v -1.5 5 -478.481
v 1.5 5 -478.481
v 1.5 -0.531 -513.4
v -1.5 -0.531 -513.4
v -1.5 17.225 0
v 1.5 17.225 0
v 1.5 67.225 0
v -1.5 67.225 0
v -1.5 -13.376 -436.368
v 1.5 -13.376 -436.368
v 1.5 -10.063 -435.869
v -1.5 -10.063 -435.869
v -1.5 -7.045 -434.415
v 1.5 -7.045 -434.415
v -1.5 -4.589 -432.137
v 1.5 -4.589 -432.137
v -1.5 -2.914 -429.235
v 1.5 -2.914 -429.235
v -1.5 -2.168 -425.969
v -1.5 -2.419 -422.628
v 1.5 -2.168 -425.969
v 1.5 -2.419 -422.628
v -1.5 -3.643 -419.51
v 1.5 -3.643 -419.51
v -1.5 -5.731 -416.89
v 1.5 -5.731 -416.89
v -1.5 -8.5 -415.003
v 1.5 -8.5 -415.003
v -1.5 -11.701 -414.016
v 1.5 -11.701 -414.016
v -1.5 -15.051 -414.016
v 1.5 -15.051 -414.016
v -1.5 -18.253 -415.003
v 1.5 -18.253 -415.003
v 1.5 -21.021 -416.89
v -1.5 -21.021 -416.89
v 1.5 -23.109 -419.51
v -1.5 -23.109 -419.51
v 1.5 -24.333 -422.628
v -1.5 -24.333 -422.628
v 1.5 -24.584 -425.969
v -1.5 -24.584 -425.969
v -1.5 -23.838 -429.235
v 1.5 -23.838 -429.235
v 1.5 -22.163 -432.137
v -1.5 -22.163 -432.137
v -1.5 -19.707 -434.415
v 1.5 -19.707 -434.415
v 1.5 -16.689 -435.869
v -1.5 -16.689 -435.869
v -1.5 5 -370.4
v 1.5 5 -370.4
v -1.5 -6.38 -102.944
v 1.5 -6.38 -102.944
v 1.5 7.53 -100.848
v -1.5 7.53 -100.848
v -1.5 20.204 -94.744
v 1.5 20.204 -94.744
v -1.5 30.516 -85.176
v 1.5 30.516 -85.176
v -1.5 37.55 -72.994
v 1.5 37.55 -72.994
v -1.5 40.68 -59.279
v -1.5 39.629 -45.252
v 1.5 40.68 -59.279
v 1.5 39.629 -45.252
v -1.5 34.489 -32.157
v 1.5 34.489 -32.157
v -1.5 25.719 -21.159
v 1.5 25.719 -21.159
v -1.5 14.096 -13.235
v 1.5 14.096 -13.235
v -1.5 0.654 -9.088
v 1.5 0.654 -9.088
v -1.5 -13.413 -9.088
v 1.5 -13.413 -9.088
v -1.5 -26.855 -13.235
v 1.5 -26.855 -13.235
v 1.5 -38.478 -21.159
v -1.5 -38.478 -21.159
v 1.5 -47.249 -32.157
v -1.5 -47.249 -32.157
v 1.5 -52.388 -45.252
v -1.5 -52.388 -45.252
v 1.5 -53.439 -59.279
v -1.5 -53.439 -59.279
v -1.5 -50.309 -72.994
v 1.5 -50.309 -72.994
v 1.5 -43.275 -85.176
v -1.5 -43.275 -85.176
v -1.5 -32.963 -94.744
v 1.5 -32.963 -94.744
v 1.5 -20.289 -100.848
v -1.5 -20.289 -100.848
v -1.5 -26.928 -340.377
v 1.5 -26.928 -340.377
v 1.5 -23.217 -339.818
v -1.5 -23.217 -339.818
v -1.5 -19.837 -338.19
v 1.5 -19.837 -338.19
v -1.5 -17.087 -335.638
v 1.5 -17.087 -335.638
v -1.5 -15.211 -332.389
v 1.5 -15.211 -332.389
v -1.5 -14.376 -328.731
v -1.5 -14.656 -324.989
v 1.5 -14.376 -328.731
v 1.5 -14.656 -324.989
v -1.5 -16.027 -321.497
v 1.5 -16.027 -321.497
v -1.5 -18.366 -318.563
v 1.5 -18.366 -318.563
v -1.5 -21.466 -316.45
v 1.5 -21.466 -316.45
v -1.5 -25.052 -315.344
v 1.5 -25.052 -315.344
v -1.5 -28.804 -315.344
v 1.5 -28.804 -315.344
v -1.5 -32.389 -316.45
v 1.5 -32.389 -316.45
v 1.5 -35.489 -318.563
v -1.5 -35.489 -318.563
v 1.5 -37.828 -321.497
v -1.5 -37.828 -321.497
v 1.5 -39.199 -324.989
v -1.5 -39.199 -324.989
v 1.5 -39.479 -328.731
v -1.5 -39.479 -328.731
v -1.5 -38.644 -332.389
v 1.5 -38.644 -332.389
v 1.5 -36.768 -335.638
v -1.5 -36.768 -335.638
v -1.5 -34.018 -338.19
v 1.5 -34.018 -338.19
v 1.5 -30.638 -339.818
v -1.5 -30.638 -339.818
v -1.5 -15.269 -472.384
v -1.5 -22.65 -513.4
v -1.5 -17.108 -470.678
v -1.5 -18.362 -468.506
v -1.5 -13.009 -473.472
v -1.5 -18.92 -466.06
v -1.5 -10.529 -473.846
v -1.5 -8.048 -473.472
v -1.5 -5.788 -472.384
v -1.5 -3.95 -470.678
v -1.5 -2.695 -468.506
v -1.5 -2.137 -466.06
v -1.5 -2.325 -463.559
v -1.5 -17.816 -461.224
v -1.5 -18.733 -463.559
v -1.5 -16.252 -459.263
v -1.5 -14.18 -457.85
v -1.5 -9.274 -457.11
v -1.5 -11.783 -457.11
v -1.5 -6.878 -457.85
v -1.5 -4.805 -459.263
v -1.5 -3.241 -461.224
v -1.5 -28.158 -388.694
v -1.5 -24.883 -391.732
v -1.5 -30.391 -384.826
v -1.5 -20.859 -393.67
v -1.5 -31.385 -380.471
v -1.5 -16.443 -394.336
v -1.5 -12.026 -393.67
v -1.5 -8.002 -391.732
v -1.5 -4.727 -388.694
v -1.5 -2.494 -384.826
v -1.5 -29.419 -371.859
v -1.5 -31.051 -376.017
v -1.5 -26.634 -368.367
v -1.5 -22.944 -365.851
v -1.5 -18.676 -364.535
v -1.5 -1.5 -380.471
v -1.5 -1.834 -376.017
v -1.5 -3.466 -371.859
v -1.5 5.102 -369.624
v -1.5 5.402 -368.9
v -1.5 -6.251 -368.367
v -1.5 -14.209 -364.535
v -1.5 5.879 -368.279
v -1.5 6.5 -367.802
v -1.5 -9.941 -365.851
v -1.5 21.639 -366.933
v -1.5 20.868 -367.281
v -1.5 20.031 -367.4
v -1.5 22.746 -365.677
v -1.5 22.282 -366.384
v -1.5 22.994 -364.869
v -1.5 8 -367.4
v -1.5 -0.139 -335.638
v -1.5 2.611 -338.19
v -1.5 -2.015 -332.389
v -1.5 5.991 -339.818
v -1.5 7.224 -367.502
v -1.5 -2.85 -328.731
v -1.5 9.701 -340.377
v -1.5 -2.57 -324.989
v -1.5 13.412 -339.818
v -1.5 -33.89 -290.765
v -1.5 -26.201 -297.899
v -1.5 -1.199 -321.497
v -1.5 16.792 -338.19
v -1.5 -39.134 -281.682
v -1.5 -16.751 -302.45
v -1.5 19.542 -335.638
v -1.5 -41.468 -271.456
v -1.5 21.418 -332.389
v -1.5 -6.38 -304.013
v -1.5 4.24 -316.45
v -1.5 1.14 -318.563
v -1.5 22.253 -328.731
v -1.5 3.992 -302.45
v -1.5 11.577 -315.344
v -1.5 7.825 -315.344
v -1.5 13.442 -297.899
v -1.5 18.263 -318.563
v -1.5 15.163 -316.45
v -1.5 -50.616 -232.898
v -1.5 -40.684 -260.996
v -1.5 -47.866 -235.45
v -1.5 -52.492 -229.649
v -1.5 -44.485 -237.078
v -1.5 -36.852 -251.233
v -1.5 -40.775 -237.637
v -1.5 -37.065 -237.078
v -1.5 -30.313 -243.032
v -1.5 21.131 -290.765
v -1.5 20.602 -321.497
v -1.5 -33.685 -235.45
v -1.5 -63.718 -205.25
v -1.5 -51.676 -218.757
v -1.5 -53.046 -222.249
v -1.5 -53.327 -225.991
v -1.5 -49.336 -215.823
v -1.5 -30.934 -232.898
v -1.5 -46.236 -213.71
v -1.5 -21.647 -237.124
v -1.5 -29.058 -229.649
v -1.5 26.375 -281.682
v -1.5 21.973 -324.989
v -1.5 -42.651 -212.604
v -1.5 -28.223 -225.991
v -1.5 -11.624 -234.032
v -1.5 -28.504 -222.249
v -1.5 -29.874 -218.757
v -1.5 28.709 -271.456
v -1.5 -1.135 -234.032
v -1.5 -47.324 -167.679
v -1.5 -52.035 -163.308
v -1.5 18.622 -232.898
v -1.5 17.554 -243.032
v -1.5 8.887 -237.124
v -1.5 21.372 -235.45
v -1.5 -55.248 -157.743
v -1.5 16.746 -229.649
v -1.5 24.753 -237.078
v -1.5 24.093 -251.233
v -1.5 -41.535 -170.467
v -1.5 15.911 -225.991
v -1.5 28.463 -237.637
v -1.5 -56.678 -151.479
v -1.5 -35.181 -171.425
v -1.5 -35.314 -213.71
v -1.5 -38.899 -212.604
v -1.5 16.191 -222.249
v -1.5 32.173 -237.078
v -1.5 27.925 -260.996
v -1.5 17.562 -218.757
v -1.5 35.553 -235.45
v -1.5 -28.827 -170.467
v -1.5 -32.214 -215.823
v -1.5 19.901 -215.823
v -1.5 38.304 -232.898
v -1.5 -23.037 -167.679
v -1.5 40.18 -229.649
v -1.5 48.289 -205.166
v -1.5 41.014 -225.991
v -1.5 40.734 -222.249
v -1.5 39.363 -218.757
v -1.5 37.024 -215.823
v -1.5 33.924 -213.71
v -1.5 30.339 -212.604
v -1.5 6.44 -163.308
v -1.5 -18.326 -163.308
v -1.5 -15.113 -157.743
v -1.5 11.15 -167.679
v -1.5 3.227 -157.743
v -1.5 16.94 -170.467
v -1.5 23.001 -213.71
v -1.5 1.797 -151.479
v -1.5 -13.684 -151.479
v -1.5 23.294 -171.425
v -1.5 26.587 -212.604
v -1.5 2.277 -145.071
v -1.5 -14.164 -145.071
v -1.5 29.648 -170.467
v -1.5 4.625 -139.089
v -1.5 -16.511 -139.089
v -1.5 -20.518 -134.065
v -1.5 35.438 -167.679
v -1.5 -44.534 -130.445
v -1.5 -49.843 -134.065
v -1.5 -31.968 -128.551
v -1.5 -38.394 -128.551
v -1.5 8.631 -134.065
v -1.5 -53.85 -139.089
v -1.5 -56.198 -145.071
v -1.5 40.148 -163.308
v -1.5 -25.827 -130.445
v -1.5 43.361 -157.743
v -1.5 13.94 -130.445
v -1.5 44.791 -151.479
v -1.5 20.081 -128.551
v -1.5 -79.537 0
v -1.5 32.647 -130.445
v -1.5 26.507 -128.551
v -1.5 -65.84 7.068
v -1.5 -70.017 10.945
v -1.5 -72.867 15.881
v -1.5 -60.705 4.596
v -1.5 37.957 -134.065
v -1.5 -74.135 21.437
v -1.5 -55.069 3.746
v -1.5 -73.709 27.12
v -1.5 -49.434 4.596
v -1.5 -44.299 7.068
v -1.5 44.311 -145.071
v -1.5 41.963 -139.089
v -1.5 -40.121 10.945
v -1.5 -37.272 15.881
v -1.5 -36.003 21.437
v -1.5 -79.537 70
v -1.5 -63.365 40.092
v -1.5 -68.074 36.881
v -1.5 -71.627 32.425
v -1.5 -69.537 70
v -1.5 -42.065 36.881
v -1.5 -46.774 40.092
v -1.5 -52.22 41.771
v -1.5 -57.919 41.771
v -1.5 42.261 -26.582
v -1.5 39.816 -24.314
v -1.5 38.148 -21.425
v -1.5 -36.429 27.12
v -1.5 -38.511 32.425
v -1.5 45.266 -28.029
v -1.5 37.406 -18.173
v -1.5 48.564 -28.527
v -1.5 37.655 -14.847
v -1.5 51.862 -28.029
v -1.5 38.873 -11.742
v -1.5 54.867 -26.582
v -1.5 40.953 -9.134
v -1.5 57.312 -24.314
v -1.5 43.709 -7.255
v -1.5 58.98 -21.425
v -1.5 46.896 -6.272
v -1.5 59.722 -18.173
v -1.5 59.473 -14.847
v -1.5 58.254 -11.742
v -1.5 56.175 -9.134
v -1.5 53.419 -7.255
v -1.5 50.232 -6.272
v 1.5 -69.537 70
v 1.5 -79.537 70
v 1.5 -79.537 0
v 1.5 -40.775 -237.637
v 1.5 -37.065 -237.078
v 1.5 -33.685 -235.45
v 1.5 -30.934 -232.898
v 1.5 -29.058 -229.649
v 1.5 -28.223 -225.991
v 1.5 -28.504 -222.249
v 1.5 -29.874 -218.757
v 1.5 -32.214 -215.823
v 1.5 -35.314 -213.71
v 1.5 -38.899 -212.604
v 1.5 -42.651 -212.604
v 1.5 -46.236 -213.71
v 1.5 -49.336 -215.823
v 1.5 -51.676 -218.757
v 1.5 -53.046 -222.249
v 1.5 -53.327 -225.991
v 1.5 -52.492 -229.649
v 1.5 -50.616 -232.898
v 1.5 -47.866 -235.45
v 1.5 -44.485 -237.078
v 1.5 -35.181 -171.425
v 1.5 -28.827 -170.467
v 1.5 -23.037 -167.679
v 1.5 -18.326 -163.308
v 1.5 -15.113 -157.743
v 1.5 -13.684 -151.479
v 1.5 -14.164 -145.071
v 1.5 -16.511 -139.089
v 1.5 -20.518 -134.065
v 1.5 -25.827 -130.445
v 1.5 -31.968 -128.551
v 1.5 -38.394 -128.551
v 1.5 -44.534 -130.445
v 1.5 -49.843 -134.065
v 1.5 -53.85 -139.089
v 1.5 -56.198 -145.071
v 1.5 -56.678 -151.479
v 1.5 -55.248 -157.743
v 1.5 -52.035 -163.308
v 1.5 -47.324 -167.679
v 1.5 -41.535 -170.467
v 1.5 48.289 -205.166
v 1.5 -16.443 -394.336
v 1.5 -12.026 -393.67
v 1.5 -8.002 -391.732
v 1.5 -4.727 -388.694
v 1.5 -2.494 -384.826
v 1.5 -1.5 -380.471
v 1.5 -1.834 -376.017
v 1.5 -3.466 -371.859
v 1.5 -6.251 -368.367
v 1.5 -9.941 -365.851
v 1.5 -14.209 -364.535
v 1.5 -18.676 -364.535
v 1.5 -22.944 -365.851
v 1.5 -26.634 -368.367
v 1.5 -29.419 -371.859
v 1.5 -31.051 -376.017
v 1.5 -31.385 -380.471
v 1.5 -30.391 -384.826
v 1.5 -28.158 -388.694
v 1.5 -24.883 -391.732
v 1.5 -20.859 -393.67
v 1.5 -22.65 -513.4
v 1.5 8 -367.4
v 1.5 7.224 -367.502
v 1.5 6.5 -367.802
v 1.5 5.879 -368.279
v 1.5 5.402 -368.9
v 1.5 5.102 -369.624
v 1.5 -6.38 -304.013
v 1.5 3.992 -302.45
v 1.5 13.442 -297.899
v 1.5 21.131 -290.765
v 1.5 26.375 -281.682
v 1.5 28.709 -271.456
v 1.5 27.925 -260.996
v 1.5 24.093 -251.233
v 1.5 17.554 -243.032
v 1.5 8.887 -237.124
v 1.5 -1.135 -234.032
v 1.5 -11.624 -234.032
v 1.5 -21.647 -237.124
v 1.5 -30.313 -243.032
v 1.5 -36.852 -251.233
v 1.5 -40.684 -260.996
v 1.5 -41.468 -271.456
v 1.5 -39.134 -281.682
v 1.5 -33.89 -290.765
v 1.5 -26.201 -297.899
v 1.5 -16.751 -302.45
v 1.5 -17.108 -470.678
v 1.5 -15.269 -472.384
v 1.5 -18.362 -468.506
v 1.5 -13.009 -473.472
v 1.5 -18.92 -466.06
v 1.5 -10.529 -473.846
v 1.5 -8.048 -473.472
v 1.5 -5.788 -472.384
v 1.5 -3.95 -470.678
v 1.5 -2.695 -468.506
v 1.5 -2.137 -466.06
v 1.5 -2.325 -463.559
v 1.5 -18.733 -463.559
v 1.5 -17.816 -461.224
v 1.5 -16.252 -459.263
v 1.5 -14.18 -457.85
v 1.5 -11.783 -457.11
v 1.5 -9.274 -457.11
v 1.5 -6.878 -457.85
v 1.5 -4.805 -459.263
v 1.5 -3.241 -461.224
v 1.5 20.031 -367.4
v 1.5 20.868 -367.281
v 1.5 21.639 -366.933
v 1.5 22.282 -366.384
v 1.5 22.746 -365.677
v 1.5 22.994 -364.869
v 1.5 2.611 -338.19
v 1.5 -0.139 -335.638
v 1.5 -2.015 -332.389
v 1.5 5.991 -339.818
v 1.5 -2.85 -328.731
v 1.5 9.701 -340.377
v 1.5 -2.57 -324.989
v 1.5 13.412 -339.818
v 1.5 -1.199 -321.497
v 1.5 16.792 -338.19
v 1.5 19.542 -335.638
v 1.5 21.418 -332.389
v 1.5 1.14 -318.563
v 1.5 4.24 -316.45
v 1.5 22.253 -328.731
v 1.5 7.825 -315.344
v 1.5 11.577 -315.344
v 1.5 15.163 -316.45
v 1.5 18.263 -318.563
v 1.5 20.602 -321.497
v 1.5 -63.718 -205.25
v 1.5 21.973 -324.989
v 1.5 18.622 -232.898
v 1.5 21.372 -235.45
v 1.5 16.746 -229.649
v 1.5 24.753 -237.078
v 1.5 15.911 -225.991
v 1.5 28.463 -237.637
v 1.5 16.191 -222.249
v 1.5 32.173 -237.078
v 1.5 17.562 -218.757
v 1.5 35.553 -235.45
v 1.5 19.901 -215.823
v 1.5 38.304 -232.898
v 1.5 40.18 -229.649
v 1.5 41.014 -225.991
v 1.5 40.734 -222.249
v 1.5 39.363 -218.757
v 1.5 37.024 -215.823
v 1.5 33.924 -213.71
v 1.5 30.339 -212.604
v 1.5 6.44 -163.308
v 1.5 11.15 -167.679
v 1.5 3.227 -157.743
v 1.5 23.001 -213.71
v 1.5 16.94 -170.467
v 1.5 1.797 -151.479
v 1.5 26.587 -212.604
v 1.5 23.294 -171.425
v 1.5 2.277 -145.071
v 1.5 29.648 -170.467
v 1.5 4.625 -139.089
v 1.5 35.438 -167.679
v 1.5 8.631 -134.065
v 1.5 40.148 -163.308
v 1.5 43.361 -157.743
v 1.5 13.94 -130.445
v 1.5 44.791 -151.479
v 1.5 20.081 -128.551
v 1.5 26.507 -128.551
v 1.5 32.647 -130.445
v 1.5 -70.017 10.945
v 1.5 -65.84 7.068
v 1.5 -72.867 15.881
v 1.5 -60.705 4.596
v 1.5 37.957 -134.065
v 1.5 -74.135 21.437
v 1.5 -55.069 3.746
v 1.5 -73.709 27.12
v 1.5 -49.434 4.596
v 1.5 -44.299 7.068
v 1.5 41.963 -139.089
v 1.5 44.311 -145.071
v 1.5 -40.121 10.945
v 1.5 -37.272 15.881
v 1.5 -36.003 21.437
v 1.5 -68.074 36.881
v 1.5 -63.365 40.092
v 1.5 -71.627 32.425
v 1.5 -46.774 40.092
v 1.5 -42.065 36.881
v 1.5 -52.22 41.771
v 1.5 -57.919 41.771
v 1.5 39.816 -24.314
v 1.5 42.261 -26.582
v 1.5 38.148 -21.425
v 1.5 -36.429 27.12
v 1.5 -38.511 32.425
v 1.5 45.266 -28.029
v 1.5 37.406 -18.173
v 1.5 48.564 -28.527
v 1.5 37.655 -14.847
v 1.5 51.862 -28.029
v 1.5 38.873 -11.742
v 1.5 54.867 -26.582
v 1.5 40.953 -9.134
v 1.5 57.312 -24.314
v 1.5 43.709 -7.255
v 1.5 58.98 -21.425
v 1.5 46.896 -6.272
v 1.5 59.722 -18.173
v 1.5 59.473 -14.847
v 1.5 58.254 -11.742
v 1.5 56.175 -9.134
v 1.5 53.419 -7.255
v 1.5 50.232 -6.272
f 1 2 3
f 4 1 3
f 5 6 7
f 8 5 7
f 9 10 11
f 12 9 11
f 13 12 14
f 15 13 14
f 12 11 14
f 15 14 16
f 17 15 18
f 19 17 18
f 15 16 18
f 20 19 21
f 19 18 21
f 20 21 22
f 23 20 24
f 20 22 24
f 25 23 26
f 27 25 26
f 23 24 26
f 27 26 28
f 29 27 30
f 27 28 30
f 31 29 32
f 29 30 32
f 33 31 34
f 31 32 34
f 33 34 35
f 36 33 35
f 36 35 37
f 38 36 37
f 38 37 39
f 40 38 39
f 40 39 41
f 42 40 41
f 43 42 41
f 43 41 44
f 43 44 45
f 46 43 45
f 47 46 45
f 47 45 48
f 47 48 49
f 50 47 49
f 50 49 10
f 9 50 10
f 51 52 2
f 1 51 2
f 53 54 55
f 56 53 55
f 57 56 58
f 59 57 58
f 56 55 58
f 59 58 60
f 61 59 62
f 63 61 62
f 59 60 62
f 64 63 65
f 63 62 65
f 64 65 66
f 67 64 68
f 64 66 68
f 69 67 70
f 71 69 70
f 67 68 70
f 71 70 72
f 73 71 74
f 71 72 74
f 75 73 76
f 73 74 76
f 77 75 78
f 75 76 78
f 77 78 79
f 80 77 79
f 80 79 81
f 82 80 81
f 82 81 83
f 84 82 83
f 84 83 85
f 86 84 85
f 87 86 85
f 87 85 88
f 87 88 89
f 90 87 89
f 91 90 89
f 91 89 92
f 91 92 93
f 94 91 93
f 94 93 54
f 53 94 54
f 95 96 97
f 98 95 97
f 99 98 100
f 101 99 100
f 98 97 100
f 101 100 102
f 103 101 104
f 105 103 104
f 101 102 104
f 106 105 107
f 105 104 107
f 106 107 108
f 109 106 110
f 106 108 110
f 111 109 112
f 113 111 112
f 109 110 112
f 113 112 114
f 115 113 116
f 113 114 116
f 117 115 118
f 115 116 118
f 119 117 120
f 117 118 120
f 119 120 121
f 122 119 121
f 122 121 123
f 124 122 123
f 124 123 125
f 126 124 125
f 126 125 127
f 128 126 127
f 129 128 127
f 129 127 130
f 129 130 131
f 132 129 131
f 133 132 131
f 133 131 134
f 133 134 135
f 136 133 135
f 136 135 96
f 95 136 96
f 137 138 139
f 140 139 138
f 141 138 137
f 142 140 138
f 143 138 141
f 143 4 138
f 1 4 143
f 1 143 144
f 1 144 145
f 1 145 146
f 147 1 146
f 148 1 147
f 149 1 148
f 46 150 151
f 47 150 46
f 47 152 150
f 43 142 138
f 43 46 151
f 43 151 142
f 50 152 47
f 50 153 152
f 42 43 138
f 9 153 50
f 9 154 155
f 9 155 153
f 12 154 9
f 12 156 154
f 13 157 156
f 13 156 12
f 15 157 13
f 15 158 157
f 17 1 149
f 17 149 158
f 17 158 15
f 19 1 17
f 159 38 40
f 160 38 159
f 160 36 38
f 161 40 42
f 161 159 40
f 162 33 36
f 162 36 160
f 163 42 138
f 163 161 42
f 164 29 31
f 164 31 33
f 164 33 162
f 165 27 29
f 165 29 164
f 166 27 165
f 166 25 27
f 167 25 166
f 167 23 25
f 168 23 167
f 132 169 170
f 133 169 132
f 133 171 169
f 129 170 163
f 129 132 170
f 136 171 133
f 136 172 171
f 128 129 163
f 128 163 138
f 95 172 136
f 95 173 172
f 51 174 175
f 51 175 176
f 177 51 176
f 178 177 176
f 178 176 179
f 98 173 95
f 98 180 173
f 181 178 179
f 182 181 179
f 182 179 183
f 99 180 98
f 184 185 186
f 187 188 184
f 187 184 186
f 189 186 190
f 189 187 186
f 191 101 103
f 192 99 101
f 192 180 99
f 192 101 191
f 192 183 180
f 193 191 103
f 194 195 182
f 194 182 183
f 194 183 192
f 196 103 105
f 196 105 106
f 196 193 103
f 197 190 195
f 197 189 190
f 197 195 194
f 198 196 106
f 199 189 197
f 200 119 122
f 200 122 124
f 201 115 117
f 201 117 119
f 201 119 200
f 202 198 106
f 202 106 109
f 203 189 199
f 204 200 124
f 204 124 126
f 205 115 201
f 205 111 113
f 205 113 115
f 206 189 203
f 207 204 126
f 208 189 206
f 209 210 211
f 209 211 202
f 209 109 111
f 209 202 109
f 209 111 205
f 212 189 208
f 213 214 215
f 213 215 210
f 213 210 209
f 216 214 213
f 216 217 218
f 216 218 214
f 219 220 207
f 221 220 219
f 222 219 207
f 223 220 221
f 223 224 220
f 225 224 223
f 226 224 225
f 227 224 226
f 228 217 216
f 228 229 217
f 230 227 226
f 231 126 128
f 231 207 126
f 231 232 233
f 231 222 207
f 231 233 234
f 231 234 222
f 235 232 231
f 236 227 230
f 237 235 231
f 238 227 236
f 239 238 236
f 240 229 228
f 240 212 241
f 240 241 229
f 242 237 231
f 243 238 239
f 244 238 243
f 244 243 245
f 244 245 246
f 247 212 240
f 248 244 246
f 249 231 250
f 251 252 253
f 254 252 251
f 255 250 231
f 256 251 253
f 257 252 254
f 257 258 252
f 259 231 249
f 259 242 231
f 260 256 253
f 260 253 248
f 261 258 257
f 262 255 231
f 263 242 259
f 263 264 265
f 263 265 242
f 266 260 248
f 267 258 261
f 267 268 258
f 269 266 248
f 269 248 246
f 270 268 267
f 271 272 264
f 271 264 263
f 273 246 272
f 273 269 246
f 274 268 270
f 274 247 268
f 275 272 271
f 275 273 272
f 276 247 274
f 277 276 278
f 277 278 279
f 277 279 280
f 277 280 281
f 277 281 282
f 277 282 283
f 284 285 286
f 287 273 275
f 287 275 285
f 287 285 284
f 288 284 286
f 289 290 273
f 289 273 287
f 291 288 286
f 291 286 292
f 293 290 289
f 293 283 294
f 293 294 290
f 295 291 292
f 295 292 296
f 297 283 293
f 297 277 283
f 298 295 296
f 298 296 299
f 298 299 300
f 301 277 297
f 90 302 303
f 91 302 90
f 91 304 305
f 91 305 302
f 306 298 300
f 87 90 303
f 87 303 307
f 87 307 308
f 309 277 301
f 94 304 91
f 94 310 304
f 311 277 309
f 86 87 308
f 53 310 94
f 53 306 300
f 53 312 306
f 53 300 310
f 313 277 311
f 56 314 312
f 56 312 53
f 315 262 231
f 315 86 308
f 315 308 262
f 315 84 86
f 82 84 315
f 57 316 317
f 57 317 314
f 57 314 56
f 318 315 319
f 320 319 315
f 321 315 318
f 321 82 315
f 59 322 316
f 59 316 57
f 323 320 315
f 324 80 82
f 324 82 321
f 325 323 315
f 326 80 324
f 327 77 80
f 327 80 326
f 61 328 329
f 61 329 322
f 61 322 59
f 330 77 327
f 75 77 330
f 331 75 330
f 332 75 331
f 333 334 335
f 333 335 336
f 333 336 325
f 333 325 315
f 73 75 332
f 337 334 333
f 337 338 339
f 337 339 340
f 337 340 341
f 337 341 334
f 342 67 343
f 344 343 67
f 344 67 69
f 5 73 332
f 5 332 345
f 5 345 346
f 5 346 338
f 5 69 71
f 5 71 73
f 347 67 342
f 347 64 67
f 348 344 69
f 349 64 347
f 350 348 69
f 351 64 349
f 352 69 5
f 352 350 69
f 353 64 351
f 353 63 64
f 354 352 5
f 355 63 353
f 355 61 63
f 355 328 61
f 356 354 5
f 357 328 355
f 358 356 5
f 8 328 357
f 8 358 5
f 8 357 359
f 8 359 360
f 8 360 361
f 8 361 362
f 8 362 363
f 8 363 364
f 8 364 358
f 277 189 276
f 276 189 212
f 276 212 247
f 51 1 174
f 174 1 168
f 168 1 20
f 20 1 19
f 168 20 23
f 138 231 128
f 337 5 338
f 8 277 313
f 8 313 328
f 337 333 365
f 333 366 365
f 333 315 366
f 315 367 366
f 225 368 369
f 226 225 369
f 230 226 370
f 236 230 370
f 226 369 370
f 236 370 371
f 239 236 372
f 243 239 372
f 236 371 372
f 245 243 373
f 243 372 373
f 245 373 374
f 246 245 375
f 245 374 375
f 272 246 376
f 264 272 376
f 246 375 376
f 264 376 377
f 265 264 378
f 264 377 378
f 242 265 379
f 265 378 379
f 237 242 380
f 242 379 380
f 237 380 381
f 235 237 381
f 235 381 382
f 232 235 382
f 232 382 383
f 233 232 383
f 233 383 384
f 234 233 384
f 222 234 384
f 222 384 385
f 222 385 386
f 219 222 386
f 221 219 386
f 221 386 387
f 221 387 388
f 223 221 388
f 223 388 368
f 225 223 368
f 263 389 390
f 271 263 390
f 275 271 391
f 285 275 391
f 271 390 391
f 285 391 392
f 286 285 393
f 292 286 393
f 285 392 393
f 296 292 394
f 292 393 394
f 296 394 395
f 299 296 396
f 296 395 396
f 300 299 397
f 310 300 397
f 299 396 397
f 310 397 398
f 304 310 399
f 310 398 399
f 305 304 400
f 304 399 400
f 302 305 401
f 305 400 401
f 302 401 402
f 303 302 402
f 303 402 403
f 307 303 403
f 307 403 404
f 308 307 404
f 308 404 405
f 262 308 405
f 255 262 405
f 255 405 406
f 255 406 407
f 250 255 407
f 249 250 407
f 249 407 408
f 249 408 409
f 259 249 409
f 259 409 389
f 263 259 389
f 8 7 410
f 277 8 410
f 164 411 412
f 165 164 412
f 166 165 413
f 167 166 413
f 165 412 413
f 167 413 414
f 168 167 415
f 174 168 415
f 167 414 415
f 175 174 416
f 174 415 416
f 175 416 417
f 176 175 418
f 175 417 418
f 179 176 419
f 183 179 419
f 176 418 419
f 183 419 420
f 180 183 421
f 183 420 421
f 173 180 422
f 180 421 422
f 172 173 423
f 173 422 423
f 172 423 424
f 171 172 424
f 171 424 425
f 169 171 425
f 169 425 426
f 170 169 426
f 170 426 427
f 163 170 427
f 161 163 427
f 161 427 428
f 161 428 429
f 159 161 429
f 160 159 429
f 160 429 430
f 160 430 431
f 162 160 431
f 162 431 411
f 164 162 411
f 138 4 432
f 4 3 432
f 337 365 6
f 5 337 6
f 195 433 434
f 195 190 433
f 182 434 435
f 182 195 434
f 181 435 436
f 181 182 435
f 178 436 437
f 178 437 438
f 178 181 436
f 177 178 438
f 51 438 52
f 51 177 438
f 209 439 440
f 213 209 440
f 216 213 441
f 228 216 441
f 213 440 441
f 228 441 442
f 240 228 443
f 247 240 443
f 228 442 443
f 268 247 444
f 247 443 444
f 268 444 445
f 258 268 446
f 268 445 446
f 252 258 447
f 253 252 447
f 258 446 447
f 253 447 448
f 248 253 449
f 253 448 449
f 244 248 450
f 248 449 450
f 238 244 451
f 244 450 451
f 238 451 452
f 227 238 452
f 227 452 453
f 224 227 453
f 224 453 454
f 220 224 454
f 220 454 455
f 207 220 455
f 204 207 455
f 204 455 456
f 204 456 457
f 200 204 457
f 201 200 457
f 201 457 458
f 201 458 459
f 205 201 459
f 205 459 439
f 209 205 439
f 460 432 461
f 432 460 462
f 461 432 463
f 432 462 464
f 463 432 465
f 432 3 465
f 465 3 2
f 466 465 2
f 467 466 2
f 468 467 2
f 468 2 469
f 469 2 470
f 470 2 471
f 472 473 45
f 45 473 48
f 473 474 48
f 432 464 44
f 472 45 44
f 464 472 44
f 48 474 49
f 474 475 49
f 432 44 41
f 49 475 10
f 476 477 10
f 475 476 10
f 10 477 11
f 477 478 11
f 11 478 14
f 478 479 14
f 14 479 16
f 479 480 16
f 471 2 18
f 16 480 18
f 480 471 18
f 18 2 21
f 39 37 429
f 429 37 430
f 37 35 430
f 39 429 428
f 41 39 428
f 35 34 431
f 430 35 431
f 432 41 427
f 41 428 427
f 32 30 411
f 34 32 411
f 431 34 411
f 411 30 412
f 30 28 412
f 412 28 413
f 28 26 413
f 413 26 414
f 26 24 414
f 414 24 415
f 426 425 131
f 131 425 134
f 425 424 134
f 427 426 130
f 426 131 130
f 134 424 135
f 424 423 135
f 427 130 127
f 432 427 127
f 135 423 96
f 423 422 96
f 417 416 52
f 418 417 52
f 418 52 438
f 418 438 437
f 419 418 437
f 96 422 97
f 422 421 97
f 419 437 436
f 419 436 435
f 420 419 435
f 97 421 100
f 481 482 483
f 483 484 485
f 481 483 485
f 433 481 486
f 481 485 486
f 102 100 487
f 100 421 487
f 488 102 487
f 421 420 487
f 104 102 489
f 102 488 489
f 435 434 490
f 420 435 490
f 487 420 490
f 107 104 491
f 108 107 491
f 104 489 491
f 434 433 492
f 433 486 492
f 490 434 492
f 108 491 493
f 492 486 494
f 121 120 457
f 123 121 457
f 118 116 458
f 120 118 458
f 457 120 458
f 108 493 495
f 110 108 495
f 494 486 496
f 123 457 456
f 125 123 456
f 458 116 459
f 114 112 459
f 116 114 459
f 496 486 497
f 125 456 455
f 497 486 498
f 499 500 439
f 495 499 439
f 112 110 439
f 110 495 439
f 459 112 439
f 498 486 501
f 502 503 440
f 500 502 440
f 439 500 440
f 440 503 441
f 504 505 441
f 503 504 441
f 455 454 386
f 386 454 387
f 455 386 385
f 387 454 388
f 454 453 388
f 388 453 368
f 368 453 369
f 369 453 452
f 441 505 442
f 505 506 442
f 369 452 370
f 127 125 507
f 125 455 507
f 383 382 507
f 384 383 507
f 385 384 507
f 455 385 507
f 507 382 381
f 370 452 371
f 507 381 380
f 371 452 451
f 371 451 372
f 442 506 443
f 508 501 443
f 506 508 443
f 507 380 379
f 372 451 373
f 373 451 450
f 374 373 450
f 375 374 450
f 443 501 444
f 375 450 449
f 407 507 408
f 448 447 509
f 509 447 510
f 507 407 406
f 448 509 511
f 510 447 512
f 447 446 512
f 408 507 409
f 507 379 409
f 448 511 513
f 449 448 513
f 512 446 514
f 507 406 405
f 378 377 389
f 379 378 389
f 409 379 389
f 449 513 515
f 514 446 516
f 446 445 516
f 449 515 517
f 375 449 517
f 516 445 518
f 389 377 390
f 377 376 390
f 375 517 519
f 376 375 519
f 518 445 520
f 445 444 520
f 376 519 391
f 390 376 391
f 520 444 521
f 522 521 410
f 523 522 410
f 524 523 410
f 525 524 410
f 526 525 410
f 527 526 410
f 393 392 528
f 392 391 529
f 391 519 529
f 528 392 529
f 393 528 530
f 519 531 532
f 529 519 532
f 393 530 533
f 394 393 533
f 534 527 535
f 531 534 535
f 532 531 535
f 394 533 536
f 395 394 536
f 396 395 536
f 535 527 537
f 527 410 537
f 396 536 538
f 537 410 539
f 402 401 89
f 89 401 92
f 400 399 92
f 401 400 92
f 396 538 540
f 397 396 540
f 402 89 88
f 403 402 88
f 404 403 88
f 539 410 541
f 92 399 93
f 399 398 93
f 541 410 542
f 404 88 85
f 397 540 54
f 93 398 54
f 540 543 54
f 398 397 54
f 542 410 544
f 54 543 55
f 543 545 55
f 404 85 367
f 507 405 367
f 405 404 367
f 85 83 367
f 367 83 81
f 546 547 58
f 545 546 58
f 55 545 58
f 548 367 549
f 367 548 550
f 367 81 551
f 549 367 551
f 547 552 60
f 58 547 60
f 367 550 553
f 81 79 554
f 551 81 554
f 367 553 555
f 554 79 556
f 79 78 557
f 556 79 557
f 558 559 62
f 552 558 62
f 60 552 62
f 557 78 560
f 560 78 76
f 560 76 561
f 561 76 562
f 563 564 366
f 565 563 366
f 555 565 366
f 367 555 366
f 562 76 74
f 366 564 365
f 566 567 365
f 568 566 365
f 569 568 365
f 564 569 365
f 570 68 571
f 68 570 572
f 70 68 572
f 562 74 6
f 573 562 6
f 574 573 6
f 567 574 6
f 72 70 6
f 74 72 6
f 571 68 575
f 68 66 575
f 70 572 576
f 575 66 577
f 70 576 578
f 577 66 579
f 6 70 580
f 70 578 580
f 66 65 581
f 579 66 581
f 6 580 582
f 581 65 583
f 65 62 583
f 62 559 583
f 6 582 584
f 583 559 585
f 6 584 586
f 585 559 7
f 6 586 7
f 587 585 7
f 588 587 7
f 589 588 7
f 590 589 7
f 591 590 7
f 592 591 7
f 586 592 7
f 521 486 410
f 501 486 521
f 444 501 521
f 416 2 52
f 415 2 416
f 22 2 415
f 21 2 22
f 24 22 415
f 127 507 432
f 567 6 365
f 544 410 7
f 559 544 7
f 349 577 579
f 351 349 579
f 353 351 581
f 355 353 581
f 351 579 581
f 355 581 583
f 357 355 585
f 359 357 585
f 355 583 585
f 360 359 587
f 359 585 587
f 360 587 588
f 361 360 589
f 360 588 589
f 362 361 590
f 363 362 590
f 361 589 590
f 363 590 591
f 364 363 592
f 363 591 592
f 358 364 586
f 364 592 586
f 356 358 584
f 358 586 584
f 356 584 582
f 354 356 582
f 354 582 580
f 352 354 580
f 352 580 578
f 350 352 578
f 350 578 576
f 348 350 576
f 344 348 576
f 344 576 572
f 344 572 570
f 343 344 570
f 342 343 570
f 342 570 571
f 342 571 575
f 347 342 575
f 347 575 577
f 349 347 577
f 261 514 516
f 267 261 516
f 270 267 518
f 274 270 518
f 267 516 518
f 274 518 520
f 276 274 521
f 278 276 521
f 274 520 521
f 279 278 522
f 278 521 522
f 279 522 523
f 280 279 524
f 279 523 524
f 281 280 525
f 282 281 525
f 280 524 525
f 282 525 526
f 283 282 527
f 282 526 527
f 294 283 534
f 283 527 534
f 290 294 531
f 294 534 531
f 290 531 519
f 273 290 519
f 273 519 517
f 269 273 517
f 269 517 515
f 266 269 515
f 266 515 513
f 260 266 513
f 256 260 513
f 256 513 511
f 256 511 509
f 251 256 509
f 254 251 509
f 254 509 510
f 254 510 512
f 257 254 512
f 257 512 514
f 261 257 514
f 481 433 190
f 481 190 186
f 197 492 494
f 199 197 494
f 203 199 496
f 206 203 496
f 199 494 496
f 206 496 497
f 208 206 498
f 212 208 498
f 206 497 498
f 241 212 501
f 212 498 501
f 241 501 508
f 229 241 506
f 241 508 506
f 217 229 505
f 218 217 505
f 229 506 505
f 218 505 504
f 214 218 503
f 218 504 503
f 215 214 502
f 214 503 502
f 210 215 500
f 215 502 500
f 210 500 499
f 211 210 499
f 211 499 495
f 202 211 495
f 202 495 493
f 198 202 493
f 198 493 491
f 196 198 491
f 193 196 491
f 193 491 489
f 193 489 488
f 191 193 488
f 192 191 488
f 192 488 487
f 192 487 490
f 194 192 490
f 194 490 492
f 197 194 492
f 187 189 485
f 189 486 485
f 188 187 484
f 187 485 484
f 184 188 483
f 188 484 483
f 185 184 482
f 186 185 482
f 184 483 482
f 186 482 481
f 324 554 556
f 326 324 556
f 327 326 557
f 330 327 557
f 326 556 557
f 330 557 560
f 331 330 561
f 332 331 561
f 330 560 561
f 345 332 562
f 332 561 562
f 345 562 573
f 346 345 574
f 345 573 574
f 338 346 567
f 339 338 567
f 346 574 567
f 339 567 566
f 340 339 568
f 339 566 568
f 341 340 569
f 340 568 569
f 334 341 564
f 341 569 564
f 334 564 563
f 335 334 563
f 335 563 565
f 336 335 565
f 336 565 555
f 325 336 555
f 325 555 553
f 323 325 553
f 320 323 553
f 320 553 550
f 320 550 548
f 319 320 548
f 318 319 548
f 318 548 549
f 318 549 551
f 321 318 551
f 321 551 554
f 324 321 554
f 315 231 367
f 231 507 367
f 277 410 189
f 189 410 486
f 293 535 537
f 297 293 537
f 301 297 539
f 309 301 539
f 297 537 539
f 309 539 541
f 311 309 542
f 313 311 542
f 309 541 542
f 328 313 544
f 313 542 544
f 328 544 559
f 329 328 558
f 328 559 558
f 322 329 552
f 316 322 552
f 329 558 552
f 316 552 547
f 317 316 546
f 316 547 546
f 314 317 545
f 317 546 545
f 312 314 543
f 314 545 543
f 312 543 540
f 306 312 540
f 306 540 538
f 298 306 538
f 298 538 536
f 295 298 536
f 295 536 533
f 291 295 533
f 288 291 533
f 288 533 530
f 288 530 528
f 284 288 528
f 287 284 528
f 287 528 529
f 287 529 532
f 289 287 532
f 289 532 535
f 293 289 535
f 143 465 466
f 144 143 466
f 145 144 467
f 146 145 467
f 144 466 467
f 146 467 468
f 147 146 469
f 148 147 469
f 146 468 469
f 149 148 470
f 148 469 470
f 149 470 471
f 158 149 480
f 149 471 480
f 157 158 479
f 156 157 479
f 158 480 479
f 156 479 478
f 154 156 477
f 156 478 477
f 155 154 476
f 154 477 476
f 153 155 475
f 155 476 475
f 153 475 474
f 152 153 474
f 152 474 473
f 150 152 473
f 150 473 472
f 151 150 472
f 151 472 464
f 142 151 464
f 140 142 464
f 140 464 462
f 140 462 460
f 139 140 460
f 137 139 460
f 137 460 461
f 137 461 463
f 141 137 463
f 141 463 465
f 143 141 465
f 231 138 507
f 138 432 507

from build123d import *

# Parameters (mm, degrees)
BOSS_EXTRUDE1_DEPTH      = 1.5
BOSS_EXTRUDE1_DEPTH_BACK = 1.5
SKETCH3_W                = 152
SKETCH3_H                = 25
CUT_EXTRUDE1_DEPTH       = 520.533194562
SKETCH4_R                = 19.119387796
SKETCH4_R_2              = 47.191393473
SKETCH4_R_3              = 35.18699184
SKETCH4_R_4              = 12.586978738
SKETCH4_R_5              = 11.189603354
SKETCH4_R_6              = 21.557380713
SKETCH4_R_7              = 14.984143728
SKETCH4_R_8              = 11.239174992
SKETCH4_R_9              = 8.41496245
CUT_EXTRUDE2_DEPTH       = 10
FILLET1_R                = 3


with BuildPart() as part:
    # Sketch2 → Boss-Extrude1 (new, two sides: drawn at the far end of the back side and taken through both)
    with BuildSketch(Plane(origin=(0, 0, 0), x_dir=(0, 0, -1), z_dir=(1, 0, 0)).offset(-BOSS_EXTRUDE1_DEPTH_BACK)):
        Polygon((0, 67.22485033), (205.165503831, 48.288859026), (513.4, -0.530689138), (513.4, -22.650154351), (205.250409944, -63.717607751), (0, -79.537288439), (-70, -79.537288439), (-70, -69.537288439), (0, 17.22485033), align=None)
    extrude(amount=BOSS_EXTRUDE1_DEPTH + BOSS_EXTRUDE1_DEPTH_BACK)

    # Sketch3 → Cut-Extrude1 (cut, through all)
    with BuildSketch(Plane(origin=(1.5, 0, 0), x_dir=(0, 0, -1), z_dir=(1, 0, 0))):
        with Locations((443.4, 17.5)):
            Rectangle(SKETCH3_W, SKETCH3_H)
    extrude(amount=-CUT_EXTRUDE1_DEPTH, mode=Mode.SUBTRACT)

    # Sketch4 → Cut-Extrude2 (cut)
    with BuildSketch(Plane(origin=(1.5, 0, 0), x_dir=(0, 0, -1), z_dir=(1, 0, 0))):
        with Locations((-22.865600385, -55.069339131)):
            Circle(SKETCH4_R)
        with Locations((55.752747866, -6.379566635)):
            Circle(SKETCH4_R_2)
        with Locations((268.826339435, -6.379566635)):
            Circle(SKETCH4_R_3)
        with Locations((225.050213704, 28.462655886)):
            Circle(SKETCH4_R_4)
        with Locations((17.336964062, 48.563938109)):
            Circle(SKETCH4_R_5)
        with Locations((225.050213704, -40.775093995)):
            Circle(SKETCH4_R_4)
        with Locations((327.790100624, -26.927544019)):
            Circle(SKETCH4_R_4)
        with Locations((327.790100624, 9.701459144)):
            Circle(SKETCH4_R_4)
        with Locations((149.867646424, 23.293890716)):
            Circle(SKETCH4_R_6)
        with Locations((149.867646424, -35.180680846)):
            Circle(SKETCH4_R_6)
        with Locations((379.3514003, -16.442535715)):
            Circle(SKETCH4_R_7)
        with Locations((425.129239545, -13.376077584)):
            Circle(SKETCH4_R_8)
        with Locations((465.431260698, -10.528652176)):
            Circle(SKETCH4_R_9)
    extrude(amount=-CUT_EXTRUDE2_DEPTH, mode=Mode.SUBTRACT)

    # Fillet1
    fillet1_edges = [part.edges().sort_by_distance(p)[0] for p in [
        (0, 5, -367.4),
        (0, 22.593439149, -367.4),
    ]]
    fillet(fillet1_edges, radius=FILLET1_R)


solid = part.part
